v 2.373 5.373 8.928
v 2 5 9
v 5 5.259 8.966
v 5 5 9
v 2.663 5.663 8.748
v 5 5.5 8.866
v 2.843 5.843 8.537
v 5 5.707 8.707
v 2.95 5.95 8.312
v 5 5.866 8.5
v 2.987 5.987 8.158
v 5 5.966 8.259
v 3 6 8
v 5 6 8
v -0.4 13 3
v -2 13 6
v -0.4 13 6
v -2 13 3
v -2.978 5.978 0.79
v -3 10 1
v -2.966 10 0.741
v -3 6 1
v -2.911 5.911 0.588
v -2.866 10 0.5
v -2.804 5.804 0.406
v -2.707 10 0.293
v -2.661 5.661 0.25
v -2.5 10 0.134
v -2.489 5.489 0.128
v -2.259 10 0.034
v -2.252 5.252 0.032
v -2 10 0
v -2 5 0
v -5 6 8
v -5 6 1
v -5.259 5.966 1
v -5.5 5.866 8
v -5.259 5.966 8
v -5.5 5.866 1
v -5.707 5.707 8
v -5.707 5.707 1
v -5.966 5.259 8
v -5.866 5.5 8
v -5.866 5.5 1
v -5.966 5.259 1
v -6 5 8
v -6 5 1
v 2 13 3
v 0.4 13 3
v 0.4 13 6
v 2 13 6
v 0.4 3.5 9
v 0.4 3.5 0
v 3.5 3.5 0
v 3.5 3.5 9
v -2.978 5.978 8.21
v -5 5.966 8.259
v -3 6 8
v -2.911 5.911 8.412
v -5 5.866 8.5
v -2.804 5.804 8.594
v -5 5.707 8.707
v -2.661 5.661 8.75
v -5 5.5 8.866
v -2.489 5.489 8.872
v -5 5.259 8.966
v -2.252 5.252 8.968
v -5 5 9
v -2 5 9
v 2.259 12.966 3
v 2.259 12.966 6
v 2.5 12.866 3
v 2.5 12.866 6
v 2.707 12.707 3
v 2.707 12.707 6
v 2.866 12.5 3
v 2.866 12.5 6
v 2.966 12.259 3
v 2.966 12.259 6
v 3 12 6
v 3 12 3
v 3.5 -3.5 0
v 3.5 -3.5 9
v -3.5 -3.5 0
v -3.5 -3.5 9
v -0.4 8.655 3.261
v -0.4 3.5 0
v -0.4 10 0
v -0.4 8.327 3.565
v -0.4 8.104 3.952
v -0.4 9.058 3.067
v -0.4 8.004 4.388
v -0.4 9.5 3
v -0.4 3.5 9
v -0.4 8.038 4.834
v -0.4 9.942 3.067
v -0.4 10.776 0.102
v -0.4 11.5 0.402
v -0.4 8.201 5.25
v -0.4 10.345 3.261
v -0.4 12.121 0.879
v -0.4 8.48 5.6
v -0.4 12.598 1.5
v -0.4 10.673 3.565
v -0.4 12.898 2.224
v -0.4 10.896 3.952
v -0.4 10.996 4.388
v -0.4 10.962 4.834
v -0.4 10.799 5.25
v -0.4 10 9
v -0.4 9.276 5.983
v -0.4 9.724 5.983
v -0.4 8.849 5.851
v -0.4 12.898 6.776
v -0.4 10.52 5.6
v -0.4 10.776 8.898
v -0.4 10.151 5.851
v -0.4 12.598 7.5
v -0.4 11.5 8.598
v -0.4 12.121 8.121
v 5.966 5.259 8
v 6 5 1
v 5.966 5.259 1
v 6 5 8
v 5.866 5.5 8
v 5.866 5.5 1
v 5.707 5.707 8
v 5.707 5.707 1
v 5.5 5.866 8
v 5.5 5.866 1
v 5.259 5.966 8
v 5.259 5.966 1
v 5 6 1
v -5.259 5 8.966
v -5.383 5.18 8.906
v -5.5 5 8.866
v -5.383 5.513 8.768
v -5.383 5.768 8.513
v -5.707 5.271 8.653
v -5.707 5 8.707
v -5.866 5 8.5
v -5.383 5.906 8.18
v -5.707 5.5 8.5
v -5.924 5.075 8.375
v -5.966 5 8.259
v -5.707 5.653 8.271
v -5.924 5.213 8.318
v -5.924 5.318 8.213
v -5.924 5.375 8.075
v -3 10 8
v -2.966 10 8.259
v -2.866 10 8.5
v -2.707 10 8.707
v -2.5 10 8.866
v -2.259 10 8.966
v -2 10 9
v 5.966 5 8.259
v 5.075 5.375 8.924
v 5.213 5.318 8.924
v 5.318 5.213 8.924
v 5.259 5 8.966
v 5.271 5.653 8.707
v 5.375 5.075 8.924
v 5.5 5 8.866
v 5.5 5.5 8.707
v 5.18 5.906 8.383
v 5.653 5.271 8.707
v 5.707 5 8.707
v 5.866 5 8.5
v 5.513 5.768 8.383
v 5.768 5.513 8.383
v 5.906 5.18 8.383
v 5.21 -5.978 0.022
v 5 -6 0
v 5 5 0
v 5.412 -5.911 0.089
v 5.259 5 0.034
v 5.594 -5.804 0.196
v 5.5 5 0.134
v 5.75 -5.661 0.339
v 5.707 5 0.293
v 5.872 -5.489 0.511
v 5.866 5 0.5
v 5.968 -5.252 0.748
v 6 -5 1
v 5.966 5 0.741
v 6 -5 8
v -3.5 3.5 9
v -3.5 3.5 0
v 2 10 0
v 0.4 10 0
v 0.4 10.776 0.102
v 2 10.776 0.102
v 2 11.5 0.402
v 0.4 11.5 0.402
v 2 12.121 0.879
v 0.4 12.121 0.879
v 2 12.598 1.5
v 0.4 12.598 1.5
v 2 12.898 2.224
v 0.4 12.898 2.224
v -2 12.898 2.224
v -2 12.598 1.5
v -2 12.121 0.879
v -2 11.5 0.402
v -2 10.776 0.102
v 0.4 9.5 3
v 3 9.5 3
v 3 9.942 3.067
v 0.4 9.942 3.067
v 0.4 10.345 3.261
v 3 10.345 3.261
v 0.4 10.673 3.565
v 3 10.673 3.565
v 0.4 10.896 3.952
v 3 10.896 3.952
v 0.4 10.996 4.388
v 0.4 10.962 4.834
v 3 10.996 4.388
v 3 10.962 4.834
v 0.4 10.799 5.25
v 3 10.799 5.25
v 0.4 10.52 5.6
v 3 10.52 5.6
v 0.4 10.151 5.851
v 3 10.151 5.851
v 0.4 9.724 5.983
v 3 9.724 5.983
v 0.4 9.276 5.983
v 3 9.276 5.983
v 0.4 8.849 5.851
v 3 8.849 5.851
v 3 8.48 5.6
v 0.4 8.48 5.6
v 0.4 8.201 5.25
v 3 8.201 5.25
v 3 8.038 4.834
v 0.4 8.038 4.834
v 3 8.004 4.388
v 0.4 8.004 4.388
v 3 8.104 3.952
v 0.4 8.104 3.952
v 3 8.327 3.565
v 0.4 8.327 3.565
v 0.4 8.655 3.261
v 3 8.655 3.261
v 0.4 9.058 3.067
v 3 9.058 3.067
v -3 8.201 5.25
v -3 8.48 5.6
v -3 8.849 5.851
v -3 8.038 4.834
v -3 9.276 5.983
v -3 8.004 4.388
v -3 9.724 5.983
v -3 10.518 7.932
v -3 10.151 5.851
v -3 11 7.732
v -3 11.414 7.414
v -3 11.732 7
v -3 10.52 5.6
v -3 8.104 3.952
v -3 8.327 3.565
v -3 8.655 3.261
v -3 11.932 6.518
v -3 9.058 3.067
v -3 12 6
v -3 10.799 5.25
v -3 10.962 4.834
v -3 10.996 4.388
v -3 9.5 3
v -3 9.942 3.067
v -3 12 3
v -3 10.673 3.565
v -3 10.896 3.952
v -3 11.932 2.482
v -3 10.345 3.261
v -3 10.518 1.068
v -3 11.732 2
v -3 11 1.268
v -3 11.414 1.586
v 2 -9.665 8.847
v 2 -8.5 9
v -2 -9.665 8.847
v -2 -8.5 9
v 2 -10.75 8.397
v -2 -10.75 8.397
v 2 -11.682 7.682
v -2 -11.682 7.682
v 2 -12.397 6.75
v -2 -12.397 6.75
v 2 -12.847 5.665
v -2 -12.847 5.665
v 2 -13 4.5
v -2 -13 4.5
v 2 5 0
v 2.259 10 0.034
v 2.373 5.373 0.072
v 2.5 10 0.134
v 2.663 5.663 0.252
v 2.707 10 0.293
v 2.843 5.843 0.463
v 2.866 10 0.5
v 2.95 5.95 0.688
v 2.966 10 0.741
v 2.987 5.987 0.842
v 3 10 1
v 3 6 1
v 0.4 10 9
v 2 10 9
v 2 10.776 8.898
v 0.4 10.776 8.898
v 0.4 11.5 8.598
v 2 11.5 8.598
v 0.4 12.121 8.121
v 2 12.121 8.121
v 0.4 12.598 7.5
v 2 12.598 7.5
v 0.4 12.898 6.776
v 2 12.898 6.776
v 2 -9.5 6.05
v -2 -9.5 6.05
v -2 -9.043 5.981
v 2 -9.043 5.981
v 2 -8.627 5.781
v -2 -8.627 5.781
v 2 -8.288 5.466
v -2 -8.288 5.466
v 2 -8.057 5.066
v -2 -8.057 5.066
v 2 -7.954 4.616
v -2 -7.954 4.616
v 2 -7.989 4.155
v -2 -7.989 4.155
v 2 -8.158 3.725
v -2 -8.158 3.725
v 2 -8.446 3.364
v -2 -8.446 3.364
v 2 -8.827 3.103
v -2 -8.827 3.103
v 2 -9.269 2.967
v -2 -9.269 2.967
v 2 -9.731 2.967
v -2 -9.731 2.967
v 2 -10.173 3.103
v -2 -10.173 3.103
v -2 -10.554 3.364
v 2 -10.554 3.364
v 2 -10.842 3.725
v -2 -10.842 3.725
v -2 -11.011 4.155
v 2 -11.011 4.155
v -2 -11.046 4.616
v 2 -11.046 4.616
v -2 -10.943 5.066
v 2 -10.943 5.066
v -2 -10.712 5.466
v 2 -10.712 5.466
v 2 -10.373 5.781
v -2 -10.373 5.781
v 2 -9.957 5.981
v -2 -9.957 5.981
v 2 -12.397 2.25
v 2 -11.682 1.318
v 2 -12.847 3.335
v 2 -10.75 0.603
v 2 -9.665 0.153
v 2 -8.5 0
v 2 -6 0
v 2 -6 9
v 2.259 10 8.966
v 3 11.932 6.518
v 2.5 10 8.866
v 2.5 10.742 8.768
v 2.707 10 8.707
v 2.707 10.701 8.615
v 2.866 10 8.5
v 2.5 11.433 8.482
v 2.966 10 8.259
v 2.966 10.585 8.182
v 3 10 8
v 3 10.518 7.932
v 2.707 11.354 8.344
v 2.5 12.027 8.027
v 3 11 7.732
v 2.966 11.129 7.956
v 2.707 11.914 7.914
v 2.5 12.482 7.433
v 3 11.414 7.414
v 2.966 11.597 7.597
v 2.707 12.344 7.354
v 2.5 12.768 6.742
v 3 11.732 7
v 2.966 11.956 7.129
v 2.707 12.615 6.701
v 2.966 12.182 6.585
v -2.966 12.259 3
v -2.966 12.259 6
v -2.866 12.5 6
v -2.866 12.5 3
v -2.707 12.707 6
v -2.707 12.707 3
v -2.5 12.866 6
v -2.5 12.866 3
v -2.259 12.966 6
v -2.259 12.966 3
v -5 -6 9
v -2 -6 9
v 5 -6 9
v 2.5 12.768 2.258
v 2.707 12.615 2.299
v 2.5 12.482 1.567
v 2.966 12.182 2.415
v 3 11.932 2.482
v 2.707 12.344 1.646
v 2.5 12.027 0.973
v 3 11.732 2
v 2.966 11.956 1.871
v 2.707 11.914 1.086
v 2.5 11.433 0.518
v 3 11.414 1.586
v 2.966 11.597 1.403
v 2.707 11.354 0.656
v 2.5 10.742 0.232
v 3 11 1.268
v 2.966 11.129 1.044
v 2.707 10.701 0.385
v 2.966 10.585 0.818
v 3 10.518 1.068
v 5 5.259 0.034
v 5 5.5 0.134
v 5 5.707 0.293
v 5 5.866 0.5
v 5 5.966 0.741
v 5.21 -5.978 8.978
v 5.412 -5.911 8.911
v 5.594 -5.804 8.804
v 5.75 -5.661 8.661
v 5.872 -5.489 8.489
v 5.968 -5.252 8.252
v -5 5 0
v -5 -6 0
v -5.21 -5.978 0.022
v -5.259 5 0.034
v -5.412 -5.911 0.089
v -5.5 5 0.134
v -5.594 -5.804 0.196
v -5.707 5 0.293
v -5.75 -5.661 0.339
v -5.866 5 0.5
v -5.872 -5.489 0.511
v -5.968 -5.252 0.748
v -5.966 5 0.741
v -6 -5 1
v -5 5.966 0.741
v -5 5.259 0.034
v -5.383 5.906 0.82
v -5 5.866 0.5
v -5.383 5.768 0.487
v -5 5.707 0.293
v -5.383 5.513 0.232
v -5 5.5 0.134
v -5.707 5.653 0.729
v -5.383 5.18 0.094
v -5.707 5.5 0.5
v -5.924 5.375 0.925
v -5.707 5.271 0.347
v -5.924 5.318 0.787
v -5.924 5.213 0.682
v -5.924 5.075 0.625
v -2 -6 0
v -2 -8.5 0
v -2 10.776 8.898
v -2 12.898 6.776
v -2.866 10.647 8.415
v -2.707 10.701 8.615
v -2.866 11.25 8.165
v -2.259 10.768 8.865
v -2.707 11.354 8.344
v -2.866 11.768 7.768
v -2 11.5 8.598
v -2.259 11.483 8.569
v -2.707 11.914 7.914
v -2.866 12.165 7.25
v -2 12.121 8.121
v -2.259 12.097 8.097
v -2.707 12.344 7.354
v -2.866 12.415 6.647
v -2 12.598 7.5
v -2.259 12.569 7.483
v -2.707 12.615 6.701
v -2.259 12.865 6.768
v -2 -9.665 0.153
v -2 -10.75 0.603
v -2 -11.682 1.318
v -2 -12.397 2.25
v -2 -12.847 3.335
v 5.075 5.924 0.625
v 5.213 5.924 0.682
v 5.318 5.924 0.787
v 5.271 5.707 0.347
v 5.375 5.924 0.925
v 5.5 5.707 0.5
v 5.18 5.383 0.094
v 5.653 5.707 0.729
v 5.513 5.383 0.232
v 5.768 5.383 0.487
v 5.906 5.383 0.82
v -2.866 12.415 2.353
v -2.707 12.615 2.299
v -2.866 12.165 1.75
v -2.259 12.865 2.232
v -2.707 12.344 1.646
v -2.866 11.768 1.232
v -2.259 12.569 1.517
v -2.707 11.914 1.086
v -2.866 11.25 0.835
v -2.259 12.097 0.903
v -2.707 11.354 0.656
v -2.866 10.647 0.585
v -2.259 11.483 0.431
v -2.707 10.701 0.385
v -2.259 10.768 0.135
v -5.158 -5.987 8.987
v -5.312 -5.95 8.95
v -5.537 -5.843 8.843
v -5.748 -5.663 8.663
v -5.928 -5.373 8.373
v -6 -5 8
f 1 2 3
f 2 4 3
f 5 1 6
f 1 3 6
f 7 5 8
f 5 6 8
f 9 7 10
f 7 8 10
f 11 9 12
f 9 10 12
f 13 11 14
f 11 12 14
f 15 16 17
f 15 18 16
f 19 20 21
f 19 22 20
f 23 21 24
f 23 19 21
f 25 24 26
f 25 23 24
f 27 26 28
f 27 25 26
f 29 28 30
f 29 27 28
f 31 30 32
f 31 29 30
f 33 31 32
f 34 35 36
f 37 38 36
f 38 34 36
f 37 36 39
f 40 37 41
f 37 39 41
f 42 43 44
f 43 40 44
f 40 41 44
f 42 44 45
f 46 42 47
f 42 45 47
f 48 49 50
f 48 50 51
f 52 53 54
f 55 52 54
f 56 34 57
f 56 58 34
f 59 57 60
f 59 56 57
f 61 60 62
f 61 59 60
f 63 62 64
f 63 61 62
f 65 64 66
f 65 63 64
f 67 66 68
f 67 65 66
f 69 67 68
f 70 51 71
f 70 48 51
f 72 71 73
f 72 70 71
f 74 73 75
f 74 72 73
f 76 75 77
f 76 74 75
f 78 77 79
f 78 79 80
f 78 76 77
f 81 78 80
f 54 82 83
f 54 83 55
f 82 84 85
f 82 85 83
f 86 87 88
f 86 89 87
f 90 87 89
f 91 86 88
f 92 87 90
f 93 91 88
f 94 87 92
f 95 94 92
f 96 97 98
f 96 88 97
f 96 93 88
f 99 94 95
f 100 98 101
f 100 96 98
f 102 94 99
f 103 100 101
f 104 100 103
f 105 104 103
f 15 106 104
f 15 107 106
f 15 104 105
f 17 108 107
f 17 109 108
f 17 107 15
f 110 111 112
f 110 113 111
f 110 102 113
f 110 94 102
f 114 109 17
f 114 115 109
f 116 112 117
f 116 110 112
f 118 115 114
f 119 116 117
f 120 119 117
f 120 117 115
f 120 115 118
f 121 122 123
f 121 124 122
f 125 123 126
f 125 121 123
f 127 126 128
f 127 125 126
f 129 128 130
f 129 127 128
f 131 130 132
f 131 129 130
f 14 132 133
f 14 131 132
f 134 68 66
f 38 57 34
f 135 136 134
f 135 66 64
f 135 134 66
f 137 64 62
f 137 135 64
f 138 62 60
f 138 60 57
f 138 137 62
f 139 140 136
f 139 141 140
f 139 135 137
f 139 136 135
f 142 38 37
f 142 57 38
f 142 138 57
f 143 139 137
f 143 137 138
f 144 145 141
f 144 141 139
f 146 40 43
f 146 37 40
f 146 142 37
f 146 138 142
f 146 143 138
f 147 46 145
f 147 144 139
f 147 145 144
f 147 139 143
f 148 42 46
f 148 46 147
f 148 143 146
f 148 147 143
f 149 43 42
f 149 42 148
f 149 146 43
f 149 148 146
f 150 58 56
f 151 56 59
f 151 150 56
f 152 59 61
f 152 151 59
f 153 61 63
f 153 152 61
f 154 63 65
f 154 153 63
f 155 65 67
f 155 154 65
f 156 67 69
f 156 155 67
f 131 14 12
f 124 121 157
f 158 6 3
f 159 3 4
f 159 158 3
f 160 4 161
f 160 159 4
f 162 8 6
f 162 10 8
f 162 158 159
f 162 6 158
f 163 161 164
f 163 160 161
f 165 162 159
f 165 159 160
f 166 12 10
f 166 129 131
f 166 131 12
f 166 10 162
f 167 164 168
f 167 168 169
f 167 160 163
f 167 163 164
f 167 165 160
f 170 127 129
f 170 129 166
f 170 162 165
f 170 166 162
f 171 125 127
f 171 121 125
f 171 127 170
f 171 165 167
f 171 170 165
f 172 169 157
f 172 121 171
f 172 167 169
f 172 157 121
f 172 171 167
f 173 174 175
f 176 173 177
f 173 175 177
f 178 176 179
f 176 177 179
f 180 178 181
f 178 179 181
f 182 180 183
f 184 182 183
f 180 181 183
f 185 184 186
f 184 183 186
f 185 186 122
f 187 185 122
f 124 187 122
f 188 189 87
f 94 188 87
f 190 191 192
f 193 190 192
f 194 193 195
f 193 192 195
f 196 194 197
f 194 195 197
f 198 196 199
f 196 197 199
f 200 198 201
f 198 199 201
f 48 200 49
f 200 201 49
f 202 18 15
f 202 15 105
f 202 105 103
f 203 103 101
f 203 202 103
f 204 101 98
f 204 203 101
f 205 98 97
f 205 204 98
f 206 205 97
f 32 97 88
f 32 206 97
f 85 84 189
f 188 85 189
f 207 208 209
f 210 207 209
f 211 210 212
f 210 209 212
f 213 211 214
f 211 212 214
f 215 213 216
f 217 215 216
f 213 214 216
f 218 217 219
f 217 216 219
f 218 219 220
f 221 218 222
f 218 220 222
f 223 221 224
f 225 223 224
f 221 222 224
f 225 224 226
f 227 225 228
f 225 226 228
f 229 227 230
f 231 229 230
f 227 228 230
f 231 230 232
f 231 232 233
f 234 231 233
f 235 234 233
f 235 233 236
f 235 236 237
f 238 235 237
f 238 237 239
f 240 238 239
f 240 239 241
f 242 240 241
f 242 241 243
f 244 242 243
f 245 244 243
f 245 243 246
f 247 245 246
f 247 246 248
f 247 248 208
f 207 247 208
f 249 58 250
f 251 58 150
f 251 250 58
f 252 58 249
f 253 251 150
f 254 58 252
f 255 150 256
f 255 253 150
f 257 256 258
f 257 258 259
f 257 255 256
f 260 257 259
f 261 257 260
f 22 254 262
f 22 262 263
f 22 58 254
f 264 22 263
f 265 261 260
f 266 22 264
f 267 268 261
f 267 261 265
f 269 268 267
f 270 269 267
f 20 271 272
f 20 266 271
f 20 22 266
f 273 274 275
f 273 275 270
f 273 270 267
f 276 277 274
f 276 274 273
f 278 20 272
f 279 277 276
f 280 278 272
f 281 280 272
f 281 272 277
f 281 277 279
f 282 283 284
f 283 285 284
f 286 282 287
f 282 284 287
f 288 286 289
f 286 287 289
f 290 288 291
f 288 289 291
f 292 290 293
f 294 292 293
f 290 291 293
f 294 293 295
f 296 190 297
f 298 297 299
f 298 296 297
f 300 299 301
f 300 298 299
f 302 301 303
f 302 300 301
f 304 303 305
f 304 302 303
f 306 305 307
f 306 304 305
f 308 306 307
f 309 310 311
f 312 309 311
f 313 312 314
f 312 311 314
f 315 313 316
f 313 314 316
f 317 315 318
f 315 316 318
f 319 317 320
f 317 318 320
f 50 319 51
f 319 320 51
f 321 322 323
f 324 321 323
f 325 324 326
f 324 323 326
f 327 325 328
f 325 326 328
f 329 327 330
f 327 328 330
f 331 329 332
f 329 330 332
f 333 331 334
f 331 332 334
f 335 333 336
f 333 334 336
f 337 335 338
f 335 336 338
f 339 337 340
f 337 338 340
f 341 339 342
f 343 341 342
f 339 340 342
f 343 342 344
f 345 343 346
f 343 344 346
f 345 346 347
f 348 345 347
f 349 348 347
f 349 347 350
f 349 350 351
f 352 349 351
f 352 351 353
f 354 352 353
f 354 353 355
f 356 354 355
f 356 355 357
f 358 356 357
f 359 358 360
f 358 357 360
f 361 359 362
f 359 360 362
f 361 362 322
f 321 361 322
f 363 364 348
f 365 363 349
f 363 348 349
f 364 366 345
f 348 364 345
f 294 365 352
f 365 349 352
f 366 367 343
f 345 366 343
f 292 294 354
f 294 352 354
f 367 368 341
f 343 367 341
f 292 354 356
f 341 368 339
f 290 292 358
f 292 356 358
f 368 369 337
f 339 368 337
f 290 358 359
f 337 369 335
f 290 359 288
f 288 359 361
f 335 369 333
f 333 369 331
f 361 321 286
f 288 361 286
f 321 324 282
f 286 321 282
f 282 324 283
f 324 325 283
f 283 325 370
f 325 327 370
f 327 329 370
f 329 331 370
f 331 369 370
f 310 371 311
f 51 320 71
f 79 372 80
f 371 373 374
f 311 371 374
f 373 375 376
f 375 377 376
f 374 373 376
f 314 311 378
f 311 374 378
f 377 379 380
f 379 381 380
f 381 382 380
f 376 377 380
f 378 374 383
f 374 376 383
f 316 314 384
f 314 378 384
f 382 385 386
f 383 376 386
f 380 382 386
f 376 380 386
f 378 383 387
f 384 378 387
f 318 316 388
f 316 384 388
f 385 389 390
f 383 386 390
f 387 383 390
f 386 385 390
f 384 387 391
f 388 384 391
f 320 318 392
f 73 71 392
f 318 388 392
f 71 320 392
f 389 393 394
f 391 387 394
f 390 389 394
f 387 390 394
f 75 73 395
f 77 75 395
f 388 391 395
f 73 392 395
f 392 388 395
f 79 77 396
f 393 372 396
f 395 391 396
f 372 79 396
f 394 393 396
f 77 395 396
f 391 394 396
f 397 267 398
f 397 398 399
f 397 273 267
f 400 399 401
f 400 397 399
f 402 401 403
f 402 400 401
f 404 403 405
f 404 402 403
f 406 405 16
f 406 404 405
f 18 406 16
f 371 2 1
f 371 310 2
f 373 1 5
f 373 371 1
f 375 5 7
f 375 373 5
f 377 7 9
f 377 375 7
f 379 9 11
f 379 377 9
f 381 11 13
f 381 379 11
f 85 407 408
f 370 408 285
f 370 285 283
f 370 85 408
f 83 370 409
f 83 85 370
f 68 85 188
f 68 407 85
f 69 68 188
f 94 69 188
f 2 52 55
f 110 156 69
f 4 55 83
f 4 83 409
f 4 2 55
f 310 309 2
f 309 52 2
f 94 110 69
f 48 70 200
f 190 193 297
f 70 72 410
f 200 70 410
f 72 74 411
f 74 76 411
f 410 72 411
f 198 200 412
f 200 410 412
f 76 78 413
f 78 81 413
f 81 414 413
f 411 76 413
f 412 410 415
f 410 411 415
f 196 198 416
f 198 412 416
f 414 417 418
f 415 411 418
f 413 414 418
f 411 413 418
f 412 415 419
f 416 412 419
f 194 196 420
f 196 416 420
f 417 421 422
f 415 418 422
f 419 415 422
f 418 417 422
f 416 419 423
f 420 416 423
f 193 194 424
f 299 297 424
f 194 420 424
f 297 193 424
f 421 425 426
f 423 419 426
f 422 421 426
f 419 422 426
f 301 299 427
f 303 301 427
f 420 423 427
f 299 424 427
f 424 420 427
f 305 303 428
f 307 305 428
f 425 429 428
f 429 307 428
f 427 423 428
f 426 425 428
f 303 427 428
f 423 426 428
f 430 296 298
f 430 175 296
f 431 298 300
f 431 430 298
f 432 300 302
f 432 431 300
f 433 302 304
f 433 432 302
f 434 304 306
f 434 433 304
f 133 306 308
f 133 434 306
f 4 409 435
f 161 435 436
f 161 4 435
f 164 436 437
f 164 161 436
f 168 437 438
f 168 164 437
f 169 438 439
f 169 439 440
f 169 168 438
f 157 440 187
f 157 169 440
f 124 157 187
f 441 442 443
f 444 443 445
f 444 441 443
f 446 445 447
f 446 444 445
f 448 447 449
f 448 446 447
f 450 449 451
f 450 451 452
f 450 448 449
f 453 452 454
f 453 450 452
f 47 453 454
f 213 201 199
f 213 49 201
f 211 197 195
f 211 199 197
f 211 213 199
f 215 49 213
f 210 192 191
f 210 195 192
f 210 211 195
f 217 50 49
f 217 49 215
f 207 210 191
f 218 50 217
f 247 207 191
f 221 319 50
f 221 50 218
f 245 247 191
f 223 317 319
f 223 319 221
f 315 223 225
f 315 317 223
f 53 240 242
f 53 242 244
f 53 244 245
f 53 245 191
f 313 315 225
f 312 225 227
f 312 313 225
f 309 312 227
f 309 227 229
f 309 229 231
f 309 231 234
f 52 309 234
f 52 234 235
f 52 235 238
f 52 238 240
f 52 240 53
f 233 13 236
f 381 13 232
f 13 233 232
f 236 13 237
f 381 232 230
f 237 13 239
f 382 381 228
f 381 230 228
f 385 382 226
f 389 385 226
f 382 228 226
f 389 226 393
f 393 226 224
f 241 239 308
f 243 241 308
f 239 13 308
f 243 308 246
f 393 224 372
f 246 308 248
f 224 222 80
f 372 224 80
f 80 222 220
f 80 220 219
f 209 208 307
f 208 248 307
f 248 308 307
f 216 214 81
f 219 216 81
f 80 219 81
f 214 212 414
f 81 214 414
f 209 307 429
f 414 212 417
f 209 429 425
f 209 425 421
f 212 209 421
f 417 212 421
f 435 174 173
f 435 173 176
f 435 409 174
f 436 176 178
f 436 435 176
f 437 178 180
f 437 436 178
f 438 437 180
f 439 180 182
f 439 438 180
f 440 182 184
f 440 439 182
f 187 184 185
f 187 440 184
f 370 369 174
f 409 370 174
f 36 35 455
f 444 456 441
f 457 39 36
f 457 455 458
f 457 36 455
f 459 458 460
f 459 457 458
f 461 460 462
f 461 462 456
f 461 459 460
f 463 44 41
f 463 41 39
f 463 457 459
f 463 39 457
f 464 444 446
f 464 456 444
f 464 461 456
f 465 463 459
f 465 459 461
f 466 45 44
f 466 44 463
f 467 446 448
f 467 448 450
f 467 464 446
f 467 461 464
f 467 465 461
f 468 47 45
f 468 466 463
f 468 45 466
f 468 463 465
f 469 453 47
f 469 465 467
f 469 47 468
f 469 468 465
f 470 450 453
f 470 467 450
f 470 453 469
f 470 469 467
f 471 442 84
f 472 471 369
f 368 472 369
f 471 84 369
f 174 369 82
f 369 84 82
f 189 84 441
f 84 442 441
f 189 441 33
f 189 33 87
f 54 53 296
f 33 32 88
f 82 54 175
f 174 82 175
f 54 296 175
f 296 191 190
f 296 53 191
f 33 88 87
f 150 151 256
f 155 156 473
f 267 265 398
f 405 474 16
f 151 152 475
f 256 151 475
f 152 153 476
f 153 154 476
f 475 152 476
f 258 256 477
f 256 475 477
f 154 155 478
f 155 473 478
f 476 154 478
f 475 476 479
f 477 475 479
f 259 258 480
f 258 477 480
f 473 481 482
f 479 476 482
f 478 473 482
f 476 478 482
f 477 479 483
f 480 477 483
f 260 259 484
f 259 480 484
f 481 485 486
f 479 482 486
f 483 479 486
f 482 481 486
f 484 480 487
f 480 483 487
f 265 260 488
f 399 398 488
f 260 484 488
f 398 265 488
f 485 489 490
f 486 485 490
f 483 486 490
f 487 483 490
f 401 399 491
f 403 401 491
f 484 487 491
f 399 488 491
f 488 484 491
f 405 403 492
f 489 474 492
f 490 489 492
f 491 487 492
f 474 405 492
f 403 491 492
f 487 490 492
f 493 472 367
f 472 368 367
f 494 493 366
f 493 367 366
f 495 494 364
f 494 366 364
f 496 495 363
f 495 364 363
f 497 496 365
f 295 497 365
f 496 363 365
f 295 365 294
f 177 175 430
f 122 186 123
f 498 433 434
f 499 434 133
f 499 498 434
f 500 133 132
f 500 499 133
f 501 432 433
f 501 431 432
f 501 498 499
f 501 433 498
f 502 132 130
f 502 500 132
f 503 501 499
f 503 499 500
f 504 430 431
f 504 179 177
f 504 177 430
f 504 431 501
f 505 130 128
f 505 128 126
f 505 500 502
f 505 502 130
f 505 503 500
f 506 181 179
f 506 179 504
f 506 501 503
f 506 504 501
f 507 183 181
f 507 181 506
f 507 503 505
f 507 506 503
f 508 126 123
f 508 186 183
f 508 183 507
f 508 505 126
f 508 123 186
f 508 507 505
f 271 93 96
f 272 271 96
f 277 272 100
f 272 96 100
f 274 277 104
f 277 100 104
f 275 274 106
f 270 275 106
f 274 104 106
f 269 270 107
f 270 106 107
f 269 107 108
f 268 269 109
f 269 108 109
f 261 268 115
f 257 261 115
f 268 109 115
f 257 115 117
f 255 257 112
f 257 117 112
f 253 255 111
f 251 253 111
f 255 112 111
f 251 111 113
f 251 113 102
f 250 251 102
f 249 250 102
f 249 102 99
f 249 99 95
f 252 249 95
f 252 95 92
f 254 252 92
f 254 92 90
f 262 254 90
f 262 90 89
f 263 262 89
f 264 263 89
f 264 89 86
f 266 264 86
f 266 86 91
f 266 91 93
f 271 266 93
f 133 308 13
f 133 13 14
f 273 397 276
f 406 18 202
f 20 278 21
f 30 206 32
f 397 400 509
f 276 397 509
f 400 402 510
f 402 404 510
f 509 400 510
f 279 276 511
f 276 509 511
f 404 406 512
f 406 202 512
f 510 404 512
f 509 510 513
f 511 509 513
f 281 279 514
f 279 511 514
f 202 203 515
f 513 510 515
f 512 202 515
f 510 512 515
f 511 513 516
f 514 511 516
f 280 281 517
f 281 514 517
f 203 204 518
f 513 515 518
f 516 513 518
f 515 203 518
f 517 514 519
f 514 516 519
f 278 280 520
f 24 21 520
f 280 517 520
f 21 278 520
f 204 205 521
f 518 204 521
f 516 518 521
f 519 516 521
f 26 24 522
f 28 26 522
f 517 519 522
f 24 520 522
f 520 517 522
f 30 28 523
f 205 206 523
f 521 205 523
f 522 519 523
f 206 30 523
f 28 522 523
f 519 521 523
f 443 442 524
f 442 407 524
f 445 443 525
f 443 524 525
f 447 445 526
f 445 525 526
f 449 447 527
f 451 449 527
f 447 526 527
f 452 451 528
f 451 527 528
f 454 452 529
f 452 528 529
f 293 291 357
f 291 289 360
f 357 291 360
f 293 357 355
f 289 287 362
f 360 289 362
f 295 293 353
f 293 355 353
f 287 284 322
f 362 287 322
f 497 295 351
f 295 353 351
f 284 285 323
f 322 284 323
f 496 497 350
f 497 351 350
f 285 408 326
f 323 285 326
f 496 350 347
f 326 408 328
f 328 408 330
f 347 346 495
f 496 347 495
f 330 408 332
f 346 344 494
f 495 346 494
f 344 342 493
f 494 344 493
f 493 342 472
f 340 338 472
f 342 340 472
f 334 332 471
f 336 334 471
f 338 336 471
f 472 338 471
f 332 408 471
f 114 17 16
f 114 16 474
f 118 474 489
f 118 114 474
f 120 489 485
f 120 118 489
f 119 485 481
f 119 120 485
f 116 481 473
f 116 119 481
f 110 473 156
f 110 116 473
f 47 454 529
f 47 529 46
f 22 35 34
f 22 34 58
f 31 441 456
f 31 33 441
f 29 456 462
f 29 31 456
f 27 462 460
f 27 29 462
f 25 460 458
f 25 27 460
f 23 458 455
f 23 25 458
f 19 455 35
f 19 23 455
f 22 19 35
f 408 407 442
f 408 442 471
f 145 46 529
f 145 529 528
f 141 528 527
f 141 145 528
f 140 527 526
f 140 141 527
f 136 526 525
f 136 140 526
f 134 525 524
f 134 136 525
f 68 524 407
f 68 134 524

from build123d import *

# Parameters (mm, degrees)
SKETCH_1_W          = 3
SKETCH_1_H          = 7
SKETCH_1_W_2        = 12
SKETCH_1_H_2        = 12
SKETCH_1_W_3        = 7
SKETCH_1_W_4        = 5
EXTRUDE_1_DEPTH     = 9
CUT_EXTRUDE_1_DEPTH = 17.911534525
FILLET_2_R          = 3
SKETCH_4_R          = 1.5
CUT_EXTRUDE_3_DEPTH = 19.193405399
FILLET_3_R          = 1
FILLET_4_R          = 1
FILLET_5_R          = 1
SKETCH_5_W          = 5
SKETCH_5_H          = 7
CUT_EXTRUDE_4_DEPTH = 9
EXTRUDE_2_DEPTH     = 7
FILLET_6_R          = 4.5
SKETCH_7_R          = 1.55
CUT_EXTRUDE_5_DEPTH = 4


# Some blends are built 0.0001 mm under size
with BuildPart() as part:
    # 草图1 → 凸台-拉伸1 (new body)
    # profile 1 of 4: a face of its own
    with BuildSketch(Plane.XY):
        with Locations((-1.5, 9.5)):
            Rectangle(SKETCH_1_W, SKETCH_1_H)
    # profile 2 of 4: a face of its own
    with BuildSketch(Plane.XY):
        with Locations((1.5, 9.5)):
            Rectangle(SKETCH_1_W, SKETCH_1_H)
    # profile 3 of 4: a face of its own
    with BuildSketch(Plane.XY):
        Rectangle(SKETCH_1_W_2, SKETCH_1_H_2)
        Rectangle(SKETCH_1_W_3, SKETCH_1_H, mode=Mode.SUBTRACT)
    # profile 4 of 4: a face of its own
    with BuildSketch(Plane.XY):
        with Locations((1, -9.5)):
            Rectangle(SKETCH_1_W_4, SKETCH_1_H)
    extrude(amount=EXTRUDE_1_DEPTH)

    # 草图2 → 切除-拉伸1 (cut, through all)
    with BuildSketch(Plane.XY.offset(9)):
        Polygon((0, 13), (0.4, 13), (0.4, 3.5), (0, 3.5), (-0.4, 3.5), (-0.4, 13), align=None)
    extrude(amount=-CUT_EXTRUDE_1_DEPTH, mode=Mode.SUBTRACT)

    # 圆角2
    fillet_2_edges = [part.edges().sort_by_distance(p)[0] for p in [
        (1.7, 13, 9),
        (1.7, 13, 0),
        (-1.7, 13, 0),
        (-1.7, 13, 9),
    ]]
    fillet(fillet_2_edges, radius=FILLET_2_R)

    # 草图4 → 切除-拉伸3 (cut, through all)
    with BuildSketch(Plane(origin=(3, 0, 0), x_dir=(0, 0, -1), z_dir=(1, 0, 0))):
        with Locations((-4.5, 9.5)):
            Circle(SKETCH_4_R)
    extrude(amount=-CUT_EXTRUDE_3_DEPTH, mode=Mode.SUBTRACT)

    # 圆角3
    fillet_3_edges = [part.edges().sort_by_distance(p)[0] for p in [
        (3, 8, 9),
        (6, 0, 0),
        (3, 8, 0),
        (4.5, 6, 0),
        (6, 6, 4.5),
        (6, -6, 4.5),
        (4.5, 6, 9),
        (6, 0, 9),
        (3, 13, 4.5),
        (3, 12.121320344, 8.121320344),
        (3, 12.121320344, 0.878679656),
    ]]
    fillet(fillet_3_edges, radius=FILLET_3_R)

    # 圆角4
    fillet_4_edges = [part.edges().sort_by_distance(p)[0] for p in [
        (-3, 8, 9),
        (-6, 0, 0),
        (-4.5, 6, 0),
        (-3, 8, 0),
        (-4.5, 6, 9),
        (-6, 0, 9),
        (-6, -6, 4.5),
        (-3, 13, 4.5),
        (-3, 12.121320344, 8.121320344),
        (-3, 12.121320344, 0.878679656),
    ]]
    fillet(fillet_4_edges, radius=FILLET_4_R)

    # 圆角5
    # the kernel refuses this fillet: 1 mm, written as the material it takes off along each edge
    with BuildSketch(Plane(origin=(-5, 5, 8), x_dir=(0, 1, 0), z_dir=(-1, 0, 0))) as fillet_5_piece_1_section:
        Polygon((0, 0), (FILLET_5_R, 0), (FILLET_5_R, -FILLET_5_R), (0, -FILLET_5_R), align=None)
    fillet_5_piece_1 = extrude(amount=FILLET_5_R, mode=Mode.PRIVATE)
    fillet_5_piece_1 = fillet_5_piece_1 - Plane(origin=(-5, 5, 8), x_dir=(0, -0.7071067811865475, -0.7071067811865475), z_dir=(-1, 0, 0)) * Sphere(FILLET_5_R, mode=Mode.PRIVATE)
    add(fillet_5_piece_1, mode=Mode.SUBTRACT)
    with BuildSketch(Plane(origin=(-5, 5, 1), x_dir=(0, 1, 0), z_dir=(-1, 0, 0))) as fillet_5_piece_2_section:
        Polygon((0, 0), (FILLET_5_R, 0), (FILLET_5_R, FILLET_5_R), (0, FILLET_5_R), align=None)
    fillet_5_piece_2 = extrude(amount=FILLET_5_R, mode=Mode.PRIVATE)
    fillet_5_piece_2 = fillet_5_piece_2 - Plane(origin=(-5, 5, 1), x_dir=(0, -0.7071067811865475, 0.7071067811865475), z_dir=(-1, 0, 0)) * Sphere(FILLET_5_R, mode=Mode.PRIVATE)
    add(fillet_5_piece_2, mode=Mode.SUBTRACT)
    with BuildSketch(Plane(origin=(-6, 6, 1), x_dir=(0, -1, 0), z_dir=(0, 0, 1))) as fillet_5_piece_3:
        with BuildLine():
            CenterArc((FILLET_5_R, FILLET_5_R), FILLET_5_R, 180, 90)
            Line((0, FILLET_5_R), (0, 0))
            Line((0, 0), (FILLET_5_R, 0))
        make_face()
    extrude(amount=7, mode=Mode.SUBTRACT)

    # 草图5 → 切除-拉伸4 (cut)
    with BuildSketch(Plane.XY.offset(9)):
        with Locations((1, -9.5)):
            Rectangle(SKETCH_5_W, SKETCH_5_H)
    extrude(amount=-CUT_EXTRUDE_4_DEPTH, mode=Mode.SUBTRACT)

    # 草图6 → 凸台-拉伸2 (add)
    with BuildSketch(Plane.XZ.offset(6)):
        Polygon((0, 9), (-2, 9), (-2, 0), (0, 0), (2, 0), (2, 9), align=None)
    extrude(amount=EXTRUDE_2_DEPTH)

    # 圆角6
    fillet_6_edges = [part.edges().sort_by_distance(p)[0] for p in [
        (0, -13, 0),
        (0, -13, 9),
    ]]
    fillet(fillet_6_edges, radius=FILLET_6_R - 0.0001)  # a hair under: the kernel refuses the full size

    # 草图7 → 切除-拉伸5 (cut)
    with BuildSketch(Plane.ZY.offset(2)):
        with Locations((4.5, -9.5)):
            Circle(SKETCH_7_R)
    extrude(amount=-CUT_EXTRUDE_5_DEPTH, mode=Mode.SUBTRACT)


solid = part.part
